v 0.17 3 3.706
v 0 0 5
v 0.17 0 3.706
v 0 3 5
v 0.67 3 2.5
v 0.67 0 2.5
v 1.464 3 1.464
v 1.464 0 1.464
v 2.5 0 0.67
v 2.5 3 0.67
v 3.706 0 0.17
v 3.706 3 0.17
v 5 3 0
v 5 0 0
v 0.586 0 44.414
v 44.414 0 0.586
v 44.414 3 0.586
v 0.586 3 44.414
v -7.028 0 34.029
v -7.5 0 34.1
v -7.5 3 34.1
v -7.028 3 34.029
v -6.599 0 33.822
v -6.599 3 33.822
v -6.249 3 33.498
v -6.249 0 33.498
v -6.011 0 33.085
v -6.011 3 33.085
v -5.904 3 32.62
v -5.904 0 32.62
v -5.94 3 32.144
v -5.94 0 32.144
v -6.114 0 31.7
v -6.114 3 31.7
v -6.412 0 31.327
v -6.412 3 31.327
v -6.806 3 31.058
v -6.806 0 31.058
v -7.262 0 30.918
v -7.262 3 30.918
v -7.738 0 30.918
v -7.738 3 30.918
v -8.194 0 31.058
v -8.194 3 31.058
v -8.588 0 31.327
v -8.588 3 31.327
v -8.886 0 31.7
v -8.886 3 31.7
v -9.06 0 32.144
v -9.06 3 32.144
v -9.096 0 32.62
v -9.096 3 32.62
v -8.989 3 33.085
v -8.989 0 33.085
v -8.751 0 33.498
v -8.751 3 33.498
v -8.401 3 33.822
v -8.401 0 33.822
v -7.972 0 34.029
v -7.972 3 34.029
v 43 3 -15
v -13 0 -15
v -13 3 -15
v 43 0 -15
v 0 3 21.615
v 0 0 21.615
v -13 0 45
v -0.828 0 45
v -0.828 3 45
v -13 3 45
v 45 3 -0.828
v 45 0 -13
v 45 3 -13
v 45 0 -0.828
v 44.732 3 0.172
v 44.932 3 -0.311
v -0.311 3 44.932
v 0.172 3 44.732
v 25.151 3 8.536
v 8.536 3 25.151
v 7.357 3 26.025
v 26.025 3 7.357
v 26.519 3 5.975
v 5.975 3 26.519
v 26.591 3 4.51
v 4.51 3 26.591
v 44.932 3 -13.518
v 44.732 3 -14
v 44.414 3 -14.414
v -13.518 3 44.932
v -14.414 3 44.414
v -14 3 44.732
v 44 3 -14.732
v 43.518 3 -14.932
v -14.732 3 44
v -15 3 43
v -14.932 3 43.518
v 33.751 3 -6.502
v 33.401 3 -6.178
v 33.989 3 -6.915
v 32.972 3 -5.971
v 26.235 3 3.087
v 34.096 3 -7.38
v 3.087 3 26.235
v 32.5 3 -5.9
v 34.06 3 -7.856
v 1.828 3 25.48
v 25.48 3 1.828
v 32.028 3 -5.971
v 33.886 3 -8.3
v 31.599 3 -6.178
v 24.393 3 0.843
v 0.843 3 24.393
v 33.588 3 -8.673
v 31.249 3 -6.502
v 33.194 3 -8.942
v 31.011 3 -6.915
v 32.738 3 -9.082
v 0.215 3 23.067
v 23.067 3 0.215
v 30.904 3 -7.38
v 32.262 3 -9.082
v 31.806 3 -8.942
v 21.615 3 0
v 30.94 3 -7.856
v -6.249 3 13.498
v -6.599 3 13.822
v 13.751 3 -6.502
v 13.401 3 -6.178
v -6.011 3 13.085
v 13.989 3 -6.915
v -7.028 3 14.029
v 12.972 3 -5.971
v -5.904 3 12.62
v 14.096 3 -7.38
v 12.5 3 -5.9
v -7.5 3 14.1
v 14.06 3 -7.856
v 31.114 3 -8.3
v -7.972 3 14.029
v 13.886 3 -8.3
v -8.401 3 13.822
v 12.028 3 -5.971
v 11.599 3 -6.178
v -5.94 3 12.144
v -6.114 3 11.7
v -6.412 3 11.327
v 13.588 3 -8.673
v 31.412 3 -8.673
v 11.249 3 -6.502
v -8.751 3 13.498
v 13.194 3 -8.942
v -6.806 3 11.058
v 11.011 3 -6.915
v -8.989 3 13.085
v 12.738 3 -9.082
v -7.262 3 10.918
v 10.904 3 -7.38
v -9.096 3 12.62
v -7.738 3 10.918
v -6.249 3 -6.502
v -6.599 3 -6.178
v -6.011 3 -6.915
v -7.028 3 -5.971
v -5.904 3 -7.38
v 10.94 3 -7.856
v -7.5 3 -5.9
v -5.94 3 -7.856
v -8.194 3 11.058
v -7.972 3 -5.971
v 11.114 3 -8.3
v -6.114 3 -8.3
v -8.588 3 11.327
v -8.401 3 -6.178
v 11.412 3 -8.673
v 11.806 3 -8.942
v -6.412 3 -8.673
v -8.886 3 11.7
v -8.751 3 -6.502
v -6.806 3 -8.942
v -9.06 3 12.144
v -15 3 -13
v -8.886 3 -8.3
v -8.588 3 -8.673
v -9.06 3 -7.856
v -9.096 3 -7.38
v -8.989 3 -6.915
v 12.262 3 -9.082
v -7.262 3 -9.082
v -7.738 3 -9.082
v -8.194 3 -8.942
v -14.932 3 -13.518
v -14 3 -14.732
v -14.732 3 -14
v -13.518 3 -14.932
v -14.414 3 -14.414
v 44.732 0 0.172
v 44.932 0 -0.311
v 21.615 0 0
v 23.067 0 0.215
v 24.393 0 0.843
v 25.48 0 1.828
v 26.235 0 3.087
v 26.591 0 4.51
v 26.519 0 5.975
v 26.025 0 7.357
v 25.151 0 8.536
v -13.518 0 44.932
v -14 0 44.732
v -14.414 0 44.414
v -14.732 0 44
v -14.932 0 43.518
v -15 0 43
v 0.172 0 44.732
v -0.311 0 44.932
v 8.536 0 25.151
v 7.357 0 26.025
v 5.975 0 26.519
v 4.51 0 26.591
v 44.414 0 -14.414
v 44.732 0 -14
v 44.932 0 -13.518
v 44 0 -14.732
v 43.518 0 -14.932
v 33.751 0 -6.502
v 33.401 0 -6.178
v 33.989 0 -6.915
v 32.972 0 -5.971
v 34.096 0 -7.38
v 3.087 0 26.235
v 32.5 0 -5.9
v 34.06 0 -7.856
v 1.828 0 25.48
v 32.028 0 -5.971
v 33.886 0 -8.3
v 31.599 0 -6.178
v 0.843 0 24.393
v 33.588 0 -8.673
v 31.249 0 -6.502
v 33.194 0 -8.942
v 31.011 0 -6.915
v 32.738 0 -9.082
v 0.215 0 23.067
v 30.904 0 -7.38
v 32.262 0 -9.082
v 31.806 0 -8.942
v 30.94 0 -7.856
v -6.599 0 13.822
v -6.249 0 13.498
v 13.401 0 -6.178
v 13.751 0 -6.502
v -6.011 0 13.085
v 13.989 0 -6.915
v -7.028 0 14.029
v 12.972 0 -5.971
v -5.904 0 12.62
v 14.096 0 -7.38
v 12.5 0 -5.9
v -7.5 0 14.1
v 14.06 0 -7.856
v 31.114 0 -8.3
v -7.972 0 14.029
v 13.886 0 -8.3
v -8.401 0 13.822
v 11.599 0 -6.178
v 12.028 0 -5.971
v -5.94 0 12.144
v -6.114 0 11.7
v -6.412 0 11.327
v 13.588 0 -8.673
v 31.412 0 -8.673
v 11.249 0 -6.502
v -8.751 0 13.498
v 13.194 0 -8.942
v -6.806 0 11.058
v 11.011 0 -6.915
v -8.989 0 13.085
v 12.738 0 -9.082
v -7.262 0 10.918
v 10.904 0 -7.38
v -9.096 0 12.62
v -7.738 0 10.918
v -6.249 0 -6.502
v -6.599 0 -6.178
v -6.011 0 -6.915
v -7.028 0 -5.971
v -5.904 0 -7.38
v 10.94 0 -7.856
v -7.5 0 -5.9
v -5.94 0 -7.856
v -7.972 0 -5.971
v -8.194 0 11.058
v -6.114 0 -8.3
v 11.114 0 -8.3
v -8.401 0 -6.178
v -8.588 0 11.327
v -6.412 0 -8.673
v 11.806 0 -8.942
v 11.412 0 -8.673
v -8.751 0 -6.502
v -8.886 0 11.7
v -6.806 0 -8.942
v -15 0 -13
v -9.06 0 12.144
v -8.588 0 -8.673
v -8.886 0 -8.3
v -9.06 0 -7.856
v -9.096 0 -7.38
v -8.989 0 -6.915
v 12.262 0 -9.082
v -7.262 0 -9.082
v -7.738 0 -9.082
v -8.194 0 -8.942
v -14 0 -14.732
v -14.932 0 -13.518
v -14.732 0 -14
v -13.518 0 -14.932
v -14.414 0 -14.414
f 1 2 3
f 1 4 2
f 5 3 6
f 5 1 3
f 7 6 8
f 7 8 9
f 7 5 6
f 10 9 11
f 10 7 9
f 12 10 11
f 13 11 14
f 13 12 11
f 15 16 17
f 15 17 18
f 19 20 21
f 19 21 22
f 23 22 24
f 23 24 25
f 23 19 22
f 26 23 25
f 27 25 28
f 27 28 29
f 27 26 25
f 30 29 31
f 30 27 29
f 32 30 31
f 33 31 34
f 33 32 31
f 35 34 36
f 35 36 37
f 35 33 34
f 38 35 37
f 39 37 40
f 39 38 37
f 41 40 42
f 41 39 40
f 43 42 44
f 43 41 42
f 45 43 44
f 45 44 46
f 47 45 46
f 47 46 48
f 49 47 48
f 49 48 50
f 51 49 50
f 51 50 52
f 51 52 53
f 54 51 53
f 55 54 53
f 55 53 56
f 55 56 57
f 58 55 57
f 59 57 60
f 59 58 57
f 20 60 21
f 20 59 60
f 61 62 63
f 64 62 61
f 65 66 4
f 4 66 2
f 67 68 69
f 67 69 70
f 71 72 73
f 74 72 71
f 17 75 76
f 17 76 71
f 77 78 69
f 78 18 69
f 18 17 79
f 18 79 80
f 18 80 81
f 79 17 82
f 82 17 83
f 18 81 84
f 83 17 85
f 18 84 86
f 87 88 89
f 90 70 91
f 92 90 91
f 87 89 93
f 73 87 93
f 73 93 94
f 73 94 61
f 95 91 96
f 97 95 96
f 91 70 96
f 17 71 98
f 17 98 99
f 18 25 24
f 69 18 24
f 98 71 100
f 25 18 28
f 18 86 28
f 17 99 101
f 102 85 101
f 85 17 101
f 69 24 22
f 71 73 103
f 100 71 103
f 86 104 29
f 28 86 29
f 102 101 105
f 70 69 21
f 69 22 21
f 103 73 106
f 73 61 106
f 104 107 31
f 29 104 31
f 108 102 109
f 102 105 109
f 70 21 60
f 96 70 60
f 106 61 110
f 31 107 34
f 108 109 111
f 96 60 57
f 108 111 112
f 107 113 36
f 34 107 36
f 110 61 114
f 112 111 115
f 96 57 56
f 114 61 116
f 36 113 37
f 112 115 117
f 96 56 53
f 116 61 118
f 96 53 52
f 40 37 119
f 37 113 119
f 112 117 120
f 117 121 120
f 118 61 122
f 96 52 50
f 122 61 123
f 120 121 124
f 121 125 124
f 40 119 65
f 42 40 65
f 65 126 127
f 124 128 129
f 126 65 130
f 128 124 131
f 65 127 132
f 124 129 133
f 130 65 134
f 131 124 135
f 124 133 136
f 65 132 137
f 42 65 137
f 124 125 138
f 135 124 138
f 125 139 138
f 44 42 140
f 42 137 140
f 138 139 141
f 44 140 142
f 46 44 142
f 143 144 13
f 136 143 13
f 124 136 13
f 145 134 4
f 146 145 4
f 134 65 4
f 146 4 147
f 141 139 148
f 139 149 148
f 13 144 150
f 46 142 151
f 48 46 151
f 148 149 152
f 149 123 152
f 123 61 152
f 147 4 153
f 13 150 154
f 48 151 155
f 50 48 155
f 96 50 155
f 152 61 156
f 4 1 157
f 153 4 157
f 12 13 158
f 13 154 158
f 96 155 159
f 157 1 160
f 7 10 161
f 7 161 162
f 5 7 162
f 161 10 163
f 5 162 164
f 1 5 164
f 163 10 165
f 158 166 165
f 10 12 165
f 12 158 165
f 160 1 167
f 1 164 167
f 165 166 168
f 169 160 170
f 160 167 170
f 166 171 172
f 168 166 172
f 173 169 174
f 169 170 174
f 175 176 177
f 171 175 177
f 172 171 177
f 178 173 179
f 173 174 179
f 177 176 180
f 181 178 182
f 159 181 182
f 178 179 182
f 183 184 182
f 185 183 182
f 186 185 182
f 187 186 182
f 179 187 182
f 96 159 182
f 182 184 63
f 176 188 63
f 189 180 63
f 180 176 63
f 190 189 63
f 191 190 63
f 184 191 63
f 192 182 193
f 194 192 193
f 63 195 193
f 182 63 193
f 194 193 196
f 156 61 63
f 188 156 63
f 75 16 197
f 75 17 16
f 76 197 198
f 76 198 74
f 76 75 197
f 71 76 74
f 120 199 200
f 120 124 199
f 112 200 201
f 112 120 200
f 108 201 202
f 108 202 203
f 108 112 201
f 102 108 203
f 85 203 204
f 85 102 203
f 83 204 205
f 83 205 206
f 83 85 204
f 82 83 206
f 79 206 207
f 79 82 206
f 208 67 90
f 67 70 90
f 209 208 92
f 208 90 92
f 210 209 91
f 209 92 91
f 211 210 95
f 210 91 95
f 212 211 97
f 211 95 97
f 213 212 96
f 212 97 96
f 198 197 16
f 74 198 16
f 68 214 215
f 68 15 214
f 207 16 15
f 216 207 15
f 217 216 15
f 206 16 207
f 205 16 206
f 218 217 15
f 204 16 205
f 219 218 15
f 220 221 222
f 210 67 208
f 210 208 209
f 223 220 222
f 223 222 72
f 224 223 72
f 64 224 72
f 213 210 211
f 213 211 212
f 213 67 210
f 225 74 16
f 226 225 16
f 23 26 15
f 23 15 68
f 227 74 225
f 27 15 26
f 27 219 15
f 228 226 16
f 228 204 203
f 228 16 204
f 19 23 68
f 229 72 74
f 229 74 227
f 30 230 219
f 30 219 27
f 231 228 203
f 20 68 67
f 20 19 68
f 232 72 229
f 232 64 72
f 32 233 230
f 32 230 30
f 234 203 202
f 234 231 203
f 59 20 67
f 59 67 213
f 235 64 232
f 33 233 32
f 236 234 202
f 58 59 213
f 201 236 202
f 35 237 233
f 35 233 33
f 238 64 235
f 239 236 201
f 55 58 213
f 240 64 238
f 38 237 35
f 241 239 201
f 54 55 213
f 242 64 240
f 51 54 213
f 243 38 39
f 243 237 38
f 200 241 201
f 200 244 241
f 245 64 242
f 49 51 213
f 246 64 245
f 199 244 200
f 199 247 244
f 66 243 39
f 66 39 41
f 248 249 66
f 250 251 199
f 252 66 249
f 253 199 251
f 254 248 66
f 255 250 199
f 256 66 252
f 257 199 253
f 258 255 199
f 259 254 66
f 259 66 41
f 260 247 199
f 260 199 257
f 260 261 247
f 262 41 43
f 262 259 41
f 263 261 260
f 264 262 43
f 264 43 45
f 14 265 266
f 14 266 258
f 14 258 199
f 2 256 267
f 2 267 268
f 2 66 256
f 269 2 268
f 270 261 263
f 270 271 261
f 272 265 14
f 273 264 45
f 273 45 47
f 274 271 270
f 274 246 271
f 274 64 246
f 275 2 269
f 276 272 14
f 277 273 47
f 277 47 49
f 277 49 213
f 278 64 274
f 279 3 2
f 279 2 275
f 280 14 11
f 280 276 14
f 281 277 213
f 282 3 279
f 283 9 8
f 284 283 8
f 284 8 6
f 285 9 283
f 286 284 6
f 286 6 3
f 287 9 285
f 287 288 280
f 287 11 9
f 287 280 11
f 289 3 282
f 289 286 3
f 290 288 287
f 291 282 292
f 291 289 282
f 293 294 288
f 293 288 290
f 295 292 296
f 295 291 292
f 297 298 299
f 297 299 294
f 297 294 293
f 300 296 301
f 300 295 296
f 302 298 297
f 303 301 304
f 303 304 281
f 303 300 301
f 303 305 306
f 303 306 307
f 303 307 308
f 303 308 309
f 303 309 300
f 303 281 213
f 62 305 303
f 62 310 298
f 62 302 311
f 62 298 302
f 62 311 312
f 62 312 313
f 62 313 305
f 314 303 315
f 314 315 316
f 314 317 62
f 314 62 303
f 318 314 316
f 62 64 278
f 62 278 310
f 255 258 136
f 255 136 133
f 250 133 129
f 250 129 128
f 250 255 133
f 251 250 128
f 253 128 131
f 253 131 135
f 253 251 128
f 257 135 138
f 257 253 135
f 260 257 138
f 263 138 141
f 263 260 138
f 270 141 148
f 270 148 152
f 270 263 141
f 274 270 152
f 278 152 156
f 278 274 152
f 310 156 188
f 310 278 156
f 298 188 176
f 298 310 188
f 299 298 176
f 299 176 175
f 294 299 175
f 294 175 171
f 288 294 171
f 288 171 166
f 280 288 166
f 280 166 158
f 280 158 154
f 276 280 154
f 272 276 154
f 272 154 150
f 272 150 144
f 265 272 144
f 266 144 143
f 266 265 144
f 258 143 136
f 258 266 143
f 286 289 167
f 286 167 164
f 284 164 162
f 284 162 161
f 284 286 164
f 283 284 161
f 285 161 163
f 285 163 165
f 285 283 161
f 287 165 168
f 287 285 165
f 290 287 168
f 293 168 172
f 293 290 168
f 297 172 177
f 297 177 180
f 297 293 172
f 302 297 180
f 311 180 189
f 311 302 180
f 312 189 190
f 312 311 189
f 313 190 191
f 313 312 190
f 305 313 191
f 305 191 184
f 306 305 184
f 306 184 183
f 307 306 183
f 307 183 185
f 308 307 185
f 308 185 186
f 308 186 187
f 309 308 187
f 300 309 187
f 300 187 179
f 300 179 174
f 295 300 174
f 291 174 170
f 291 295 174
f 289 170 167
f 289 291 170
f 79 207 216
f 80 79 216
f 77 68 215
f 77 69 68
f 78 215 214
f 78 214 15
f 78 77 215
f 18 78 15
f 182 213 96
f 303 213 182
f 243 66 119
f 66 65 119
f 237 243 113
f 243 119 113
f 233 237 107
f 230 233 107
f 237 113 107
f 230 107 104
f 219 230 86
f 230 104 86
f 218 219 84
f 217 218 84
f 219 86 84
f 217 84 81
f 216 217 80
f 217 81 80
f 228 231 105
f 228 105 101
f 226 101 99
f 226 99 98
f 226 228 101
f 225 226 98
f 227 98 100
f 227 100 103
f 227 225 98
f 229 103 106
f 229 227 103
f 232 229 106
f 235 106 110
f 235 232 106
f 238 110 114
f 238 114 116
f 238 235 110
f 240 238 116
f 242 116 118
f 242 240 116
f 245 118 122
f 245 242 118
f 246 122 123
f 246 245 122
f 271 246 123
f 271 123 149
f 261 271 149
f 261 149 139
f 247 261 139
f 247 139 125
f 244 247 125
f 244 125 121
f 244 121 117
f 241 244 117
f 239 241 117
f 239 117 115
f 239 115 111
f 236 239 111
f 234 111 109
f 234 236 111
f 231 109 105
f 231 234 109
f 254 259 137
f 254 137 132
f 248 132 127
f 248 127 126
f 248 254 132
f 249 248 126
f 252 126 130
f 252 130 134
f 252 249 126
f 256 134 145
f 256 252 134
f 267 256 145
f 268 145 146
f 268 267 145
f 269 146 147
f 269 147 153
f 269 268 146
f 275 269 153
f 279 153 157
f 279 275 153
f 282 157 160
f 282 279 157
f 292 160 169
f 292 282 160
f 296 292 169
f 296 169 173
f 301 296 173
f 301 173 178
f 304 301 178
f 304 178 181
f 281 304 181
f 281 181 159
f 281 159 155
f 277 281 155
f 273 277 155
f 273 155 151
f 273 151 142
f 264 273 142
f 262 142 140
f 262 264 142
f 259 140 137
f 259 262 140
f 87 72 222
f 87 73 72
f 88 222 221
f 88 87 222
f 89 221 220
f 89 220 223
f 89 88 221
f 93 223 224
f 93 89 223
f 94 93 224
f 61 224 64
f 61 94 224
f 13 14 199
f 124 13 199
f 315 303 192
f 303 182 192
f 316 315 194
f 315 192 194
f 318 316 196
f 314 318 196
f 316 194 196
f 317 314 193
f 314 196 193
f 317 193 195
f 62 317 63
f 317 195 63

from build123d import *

# Parameters (mm, degrees)
SKETCH_1_R      = 1.6
EXTRUDE_1_DEPTH = 3
FILLET_1_R      = 2
FILLET_2_R      = 5


with BuildPart() as part:
    # 草图1 → 凸台-拉伸1 (new body)
    with BuildSketch(Plane(origin=(0, 0, 0), x_dir=(1, 0, 0), z_dir=(0, 1, 0))):
        Polygon((0, -45), (-15, -45), (-15, 15), (45, 15), (45, 0), align=None)
        with Locations(Location((-7.5, -12.5, 0), (0, 0, 270))):
            Circle(SKETCH_1_R, mode=Mode.SUBTRACT)
        with Locations(Location((-7.5, -32.5, 0), (0, 0, 270))):
            Circle(SKETCH_1_R, mode=Mode.SUBTRACT)
        with Locations(Location((-7.5, 7.5, 0), (0, 0, 270))):
            Circle(SKETCH_1_R, mode=Mode.SUBTRACT)
        with Locations(Location((12.5, 7.5, 0), (0, 0, 270))):
            Circle(SKETCH_1_R, mode=Mode.SUBTRACT)
        with Locations(Location((32.5, 7.5, 0), (0, 0, 270))):
            Circle(SKETCH_1_R, mode=Mode.SUBTRACT)
        Polygon((0, -33.686291501), (0, 0), (33.686291501, 0), align=None, mode=Mode.SUBTRACT)
    extrude(amount=EXTRUDE_1_DEPTH)

    # 圆角1
    fillet_1_edges = [part.edges().sort_by_distance(p)[0] for p in [
        (0, 1.5, 45),
        (-15, 1.5, 45),
        (-15, 1.5, -15),
        (45, 1.5, -15),
        (45, 1.5, 0),
    ]]
    fillet(fillet_1_edges, radius=FILLET_1_R)

    # 圆角2
    fillet_2_edges = [part.edges().sort_by_distance(p)[0] for p in [
        (33.686291501, 1.5, 0),
        (0, 1.5, 0),
        (0, 1.5, 33.686291501),
    ]]
    fillet(fillet_2_edges, radius=FILLET_2_R)


solid = part.part
